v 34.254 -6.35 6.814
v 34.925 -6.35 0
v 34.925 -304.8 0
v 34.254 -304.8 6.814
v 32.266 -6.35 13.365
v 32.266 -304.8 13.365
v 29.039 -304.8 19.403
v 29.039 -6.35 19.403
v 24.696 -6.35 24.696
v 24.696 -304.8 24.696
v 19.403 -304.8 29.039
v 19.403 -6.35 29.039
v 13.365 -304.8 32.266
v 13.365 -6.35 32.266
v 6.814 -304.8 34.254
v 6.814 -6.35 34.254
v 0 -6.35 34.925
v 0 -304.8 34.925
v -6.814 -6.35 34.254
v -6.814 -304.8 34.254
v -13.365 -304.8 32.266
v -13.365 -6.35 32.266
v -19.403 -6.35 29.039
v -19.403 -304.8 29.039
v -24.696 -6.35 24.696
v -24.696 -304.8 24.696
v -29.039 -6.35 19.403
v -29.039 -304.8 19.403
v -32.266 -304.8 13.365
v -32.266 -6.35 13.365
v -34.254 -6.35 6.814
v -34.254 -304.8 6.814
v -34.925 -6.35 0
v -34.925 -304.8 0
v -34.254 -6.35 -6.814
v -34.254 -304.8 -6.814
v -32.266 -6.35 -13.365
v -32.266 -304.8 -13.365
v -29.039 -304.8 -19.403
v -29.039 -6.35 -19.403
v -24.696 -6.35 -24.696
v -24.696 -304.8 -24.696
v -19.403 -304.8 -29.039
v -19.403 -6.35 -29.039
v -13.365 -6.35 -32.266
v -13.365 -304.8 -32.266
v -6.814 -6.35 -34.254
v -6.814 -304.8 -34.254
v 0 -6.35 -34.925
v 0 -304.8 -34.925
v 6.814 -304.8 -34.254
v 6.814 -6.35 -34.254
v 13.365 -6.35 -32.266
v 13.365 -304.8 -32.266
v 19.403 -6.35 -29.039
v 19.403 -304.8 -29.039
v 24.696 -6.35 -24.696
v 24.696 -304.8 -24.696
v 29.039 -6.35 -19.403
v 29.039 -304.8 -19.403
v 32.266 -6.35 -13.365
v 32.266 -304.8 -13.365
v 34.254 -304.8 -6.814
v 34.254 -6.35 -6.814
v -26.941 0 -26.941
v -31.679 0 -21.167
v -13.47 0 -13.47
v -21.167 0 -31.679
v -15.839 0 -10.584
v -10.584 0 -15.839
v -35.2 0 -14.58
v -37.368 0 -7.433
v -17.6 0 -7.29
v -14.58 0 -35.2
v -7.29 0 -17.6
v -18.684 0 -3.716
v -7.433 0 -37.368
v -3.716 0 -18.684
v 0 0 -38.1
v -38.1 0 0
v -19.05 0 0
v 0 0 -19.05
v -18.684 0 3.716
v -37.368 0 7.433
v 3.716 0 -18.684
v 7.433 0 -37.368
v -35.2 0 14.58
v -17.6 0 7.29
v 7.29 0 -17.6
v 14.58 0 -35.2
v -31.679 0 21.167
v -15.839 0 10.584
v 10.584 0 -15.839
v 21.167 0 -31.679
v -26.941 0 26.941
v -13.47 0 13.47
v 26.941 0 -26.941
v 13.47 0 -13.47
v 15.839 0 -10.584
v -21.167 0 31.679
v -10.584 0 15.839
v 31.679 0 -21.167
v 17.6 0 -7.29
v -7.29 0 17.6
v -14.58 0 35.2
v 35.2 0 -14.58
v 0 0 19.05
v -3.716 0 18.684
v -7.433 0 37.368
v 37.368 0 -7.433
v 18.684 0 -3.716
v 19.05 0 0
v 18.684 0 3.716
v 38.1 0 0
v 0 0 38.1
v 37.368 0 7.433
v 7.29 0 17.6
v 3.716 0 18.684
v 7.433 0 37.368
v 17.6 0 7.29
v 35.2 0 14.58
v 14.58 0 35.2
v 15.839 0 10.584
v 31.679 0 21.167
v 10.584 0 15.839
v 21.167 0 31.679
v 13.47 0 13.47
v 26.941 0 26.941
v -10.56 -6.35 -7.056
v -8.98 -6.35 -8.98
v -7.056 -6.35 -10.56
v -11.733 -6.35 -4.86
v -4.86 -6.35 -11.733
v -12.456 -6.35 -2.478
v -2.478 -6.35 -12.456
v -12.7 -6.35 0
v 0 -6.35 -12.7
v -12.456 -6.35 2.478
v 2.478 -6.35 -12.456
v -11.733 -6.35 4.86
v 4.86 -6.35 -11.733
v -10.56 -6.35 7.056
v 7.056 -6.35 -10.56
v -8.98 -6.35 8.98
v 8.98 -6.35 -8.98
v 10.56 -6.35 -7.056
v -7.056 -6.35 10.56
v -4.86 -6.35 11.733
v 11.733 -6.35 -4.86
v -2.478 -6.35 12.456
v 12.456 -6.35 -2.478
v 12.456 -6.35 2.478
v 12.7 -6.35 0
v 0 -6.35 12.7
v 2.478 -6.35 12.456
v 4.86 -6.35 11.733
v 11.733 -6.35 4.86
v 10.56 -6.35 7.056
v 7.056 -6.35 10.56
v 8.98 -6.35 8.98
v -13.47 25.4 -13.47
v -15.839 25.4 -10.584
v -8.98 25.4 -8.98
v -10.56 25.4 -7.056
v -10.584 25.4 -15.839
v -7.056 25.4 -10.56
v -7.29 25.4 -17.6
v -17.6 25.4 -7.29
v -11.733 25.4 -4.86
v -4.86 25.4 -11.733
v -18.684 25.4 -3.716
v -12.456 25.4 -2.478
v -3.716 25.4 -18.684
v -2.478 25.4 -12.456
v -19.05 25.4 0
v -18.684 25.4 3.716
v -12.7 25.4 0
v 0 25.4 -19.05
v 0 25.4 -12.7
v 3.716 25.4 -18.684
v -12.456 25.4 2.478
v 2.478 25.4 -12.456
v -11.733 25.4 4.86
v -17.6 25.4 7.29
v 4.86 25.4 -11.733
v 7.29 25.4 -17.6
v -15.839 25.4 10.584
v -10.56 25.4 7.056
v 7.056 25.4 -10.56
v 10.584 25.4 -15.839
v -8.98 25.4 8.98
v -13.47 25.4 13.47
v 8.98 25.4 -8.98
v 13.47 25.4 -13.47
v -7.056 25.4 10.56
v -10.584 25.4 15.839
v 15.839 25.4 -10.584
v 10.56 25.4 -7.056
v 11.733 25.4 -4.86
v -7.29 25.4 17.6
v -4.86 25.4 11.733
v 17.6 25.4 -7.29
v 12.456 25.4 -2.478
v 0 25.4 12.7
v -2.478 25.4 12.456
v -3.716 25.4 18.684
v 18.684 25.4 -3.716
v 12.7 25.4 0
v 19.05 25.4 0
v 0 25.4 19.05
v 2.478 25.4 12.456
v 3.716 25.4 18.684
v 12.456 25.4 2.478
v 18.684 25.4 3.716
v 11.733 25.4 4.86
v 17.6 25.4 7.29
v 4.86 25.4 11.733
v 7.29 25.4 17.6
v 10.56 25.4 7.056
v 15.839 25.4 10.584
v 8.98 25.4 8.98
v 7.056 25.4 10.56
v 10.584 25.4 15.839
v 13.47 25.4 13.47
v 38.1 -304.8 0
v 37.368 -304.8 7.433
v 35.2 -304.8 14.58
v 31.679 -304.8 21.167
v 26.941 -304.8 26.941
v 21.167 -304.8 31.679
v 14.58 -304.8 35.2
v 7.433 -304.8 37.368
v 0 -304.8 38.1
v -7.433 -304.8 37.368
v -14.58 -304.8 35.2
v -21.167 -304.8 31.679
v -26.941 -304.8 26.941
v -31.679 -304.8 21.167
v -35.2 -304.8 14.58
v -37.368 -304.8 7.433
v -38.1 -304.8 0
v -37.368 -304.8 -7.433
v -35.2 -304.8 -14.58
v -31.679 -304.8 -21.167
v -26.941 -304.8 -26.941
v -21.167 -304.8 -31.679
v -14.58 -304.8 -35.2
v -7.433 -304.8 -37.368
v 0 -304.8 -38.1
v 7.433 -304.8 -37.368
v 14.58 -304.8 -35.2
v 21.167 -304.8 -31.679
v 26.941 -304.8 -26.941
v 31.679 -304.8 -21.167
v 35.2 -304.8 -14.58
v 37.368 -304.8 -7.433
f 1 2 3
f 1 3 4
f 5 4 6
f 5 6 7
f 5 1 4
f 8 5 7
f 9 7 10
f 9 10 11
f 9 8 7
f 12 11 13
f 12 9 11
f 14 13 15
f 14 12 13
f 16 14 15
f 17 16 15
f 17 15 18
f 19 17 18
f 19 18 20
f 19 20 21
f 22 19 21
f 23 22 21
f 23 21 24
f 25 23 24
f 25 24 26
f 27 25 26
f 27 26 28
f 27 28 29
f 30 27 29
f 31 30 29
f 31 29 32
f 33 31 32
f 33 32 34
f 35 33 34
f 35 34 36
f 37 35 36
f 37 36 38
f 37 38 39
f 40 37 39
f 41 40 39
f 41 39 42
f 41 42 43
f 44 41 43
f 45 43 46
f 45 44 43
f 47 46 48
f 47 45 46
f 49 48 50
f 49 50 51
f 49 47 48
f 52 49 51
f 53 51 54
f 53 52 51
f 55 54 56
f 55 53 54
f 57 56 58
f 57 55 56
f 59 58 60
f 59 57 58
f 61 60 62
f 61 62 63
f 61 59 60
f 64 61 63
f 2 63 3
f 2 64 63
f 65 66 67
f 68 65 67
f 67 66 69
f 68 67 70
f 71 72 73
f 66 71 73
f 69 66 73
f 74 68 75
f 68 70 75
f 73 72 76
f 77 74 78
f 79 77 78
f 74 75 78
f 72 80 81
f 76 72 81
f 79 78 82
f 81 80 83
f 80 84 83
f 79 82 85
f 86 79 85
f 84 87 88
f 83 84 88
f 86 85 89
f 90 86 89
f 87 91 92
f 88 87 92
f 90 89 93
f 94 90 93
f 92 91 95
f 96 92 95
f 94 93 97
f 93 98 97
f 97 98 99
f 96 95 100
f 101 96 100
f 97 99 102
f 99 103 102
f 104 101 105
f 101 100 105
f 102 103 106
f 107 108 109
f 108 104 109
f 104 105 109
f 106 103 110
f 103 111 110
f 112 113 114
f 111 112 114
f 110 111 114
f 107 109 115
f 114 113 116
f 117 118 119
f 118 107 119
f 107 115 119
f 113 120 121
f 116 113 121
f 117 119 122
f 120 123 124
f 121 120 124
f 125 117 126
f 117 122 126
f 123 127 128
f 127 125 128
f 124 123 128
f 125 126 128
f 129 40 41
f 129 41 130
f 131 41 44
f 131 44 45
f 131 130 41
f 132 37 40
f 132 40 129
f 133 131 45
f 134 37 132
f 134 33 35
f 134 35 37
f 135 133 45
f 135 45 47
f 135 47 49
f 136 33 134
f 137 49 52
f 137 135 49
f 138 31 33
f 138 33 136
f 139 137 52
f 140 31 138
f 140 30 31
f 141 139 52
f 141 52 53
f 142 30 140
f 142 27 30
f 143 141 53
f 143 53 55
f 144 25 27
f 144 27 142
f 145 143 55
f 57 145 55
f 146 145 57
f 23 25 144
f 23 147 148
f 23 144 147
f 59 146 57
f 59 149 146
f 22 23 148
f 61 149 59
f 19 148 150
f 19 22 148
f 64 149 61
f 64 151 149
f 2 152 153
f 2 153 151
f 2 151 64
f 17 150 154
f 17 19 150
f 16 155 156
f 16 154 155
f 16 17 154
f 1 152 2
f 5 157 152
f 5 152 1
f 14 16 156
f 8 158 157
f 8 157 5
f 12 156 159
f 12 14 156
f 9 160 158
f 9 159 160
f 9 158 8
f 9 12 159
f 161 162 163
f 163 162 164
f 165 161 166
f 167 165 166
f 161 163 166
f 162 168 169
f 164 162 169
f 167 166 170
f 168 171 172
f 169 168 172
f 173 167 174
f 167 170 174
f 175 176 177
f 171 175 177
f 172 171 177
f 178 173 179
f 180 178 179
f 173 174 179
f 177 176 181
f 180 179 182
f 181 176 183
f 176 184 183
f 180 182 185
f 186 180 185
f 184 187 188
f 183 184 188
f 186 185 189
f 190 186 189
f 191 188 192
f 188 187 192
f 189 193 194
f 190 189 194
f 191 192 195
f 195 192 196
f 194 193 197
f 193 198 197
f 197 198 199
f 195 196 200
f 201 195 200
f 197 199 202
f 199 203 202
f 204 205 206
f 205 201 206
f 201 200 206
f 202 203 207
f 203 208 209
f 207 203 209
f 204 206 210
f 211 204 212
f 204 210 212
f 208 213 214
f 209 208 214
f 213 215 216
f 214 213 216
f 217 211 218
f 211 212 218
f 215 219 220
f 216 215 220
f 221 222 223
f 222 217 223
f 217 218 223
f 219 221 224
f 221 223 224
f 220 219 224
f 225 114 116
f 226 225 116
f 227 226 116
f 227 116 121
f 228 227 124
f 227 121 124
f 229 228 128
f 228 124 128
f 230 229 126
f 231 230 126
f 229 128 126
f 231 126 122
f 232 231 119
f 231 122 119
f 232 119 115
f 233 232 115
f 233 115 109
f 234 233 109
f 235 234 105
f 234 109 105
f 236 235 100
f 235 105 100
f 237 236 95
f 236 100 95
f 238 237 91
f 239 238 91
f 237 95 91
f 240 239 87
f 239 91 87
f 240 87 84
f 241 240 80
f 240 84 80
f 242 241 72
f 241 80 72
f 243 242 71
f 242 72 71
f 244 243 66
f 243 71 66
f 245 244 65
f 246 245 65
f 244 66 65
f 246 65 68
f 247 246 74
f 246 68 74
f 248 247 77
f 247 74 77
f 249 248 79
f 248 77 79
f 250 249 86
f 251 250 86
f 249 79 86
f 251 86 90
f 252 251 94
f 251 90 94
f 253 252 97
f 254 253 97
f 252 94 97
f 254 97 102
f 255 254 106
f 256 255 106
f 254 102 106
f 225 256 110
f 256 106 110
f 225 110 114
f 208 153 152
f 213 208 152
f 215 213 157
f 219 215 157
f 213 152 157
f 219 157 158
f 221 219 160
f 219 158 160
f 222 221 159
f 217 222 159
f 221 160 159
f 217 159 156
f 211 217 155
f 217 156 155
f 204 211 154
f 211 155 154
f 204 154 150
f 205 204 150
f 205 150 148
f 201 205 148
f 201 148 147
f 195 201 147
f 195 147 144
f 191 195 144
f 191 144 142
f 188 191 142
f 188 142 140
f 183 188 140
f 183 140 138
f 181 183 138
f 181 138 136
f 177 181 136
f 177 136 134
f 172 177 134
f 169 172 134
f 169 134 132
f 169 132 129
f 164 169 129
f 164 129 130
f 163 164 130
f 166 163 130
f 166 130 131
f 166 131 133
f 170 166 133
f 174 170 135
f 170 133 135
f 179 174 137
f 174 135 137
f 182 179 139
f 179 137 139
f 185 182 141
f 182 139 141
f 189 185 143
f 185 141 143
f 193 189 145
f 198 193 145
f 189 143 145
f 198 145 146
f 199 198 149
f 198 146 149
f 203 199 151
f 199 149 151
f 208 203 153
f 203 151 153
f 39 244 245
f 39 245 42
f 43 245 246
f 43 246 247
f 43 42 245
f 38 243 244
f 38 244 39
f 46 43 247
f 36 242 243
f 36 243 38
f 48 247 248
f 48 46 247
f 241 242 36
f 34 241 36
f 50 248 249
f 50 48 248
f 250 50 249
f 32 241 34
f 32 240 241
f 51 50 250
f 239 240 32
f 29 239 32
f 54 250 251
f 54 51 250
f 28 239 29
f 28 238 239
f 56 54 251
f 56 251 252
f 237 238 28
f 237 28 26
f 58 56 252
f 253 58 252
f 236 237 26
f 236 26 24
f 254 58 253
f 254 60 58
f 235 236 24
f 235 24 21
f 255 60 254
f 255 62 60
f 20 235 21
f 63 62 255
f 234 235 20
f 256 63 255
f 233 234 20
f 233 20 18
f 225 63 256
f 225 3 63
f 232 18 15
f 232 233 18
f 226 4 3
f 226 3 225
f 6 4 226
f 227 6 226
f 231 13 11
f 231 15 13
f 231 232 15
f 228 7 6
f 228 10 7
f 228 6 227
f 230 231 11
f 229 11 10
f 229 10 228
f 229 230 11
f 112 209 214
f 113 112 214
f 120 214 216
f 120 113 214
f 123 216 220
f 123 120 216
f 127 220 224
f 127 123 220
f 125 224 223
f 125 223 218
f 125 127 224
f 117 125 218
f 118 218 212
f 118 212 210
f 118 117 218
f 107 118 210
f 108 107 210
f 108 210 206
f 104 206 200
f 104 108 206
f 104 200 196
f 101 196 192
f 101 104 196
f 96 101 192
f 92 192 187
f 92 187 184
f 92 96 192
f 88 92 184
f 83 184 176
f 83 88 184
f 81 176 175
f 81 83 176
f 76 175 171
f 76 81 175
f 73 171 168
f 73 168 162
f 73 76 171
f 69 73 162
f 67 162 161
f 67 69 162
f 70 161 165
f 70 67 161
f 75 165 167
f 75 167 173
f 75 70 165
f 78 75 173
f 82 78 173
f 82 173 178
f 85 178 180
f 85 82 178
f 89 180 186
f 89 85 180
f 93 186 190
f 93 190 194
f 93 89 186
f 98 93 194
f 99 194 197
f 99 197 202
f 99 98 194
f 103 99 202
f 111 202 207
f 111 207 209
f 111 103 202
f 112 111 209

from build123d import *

# Parameters (mm, degrees)
F0_R     = 38.1
F0_R_2   = 34.925
F1_DEPTH = 304.8
F2_DEPTH = 6.35
F3_R     = 19.05
F4_DEPTH = 25.4
F6_D     = 25.4
F6_DEPTH = 38.1


with BuildPart() as f1:
    # F0 (on Front) → F1 (new body)
    with BuildSketch(Plane.XZ):
        Circle(F0_R)
        Circle(F0_R_2, mode=Mode.SUBTRACT)
    extrude(amount=F1_DEPTH)

    # F0 (on Front) → F2 (join)
    with BuildSketch(Plane.XZ):
        Circle(F0_R_2)
    extrude(amount=F2_DEPTH)

    # F3 (on face) → F4 (join)
    with BuildSketch(Plane.XZ):
        Circle(F3_R)
    extrude(amount=-F4_DEPTH)

    # F6
    with Locations(Plane(origin=(0, 25.4, 0), x_dir=(-1, 0, 0), z_dir=(0, 1, 0))):
        with Locations((0, 0)):
            Hole(F6_D / 2, depth=F6_DEPTH)


solid = f1.part
